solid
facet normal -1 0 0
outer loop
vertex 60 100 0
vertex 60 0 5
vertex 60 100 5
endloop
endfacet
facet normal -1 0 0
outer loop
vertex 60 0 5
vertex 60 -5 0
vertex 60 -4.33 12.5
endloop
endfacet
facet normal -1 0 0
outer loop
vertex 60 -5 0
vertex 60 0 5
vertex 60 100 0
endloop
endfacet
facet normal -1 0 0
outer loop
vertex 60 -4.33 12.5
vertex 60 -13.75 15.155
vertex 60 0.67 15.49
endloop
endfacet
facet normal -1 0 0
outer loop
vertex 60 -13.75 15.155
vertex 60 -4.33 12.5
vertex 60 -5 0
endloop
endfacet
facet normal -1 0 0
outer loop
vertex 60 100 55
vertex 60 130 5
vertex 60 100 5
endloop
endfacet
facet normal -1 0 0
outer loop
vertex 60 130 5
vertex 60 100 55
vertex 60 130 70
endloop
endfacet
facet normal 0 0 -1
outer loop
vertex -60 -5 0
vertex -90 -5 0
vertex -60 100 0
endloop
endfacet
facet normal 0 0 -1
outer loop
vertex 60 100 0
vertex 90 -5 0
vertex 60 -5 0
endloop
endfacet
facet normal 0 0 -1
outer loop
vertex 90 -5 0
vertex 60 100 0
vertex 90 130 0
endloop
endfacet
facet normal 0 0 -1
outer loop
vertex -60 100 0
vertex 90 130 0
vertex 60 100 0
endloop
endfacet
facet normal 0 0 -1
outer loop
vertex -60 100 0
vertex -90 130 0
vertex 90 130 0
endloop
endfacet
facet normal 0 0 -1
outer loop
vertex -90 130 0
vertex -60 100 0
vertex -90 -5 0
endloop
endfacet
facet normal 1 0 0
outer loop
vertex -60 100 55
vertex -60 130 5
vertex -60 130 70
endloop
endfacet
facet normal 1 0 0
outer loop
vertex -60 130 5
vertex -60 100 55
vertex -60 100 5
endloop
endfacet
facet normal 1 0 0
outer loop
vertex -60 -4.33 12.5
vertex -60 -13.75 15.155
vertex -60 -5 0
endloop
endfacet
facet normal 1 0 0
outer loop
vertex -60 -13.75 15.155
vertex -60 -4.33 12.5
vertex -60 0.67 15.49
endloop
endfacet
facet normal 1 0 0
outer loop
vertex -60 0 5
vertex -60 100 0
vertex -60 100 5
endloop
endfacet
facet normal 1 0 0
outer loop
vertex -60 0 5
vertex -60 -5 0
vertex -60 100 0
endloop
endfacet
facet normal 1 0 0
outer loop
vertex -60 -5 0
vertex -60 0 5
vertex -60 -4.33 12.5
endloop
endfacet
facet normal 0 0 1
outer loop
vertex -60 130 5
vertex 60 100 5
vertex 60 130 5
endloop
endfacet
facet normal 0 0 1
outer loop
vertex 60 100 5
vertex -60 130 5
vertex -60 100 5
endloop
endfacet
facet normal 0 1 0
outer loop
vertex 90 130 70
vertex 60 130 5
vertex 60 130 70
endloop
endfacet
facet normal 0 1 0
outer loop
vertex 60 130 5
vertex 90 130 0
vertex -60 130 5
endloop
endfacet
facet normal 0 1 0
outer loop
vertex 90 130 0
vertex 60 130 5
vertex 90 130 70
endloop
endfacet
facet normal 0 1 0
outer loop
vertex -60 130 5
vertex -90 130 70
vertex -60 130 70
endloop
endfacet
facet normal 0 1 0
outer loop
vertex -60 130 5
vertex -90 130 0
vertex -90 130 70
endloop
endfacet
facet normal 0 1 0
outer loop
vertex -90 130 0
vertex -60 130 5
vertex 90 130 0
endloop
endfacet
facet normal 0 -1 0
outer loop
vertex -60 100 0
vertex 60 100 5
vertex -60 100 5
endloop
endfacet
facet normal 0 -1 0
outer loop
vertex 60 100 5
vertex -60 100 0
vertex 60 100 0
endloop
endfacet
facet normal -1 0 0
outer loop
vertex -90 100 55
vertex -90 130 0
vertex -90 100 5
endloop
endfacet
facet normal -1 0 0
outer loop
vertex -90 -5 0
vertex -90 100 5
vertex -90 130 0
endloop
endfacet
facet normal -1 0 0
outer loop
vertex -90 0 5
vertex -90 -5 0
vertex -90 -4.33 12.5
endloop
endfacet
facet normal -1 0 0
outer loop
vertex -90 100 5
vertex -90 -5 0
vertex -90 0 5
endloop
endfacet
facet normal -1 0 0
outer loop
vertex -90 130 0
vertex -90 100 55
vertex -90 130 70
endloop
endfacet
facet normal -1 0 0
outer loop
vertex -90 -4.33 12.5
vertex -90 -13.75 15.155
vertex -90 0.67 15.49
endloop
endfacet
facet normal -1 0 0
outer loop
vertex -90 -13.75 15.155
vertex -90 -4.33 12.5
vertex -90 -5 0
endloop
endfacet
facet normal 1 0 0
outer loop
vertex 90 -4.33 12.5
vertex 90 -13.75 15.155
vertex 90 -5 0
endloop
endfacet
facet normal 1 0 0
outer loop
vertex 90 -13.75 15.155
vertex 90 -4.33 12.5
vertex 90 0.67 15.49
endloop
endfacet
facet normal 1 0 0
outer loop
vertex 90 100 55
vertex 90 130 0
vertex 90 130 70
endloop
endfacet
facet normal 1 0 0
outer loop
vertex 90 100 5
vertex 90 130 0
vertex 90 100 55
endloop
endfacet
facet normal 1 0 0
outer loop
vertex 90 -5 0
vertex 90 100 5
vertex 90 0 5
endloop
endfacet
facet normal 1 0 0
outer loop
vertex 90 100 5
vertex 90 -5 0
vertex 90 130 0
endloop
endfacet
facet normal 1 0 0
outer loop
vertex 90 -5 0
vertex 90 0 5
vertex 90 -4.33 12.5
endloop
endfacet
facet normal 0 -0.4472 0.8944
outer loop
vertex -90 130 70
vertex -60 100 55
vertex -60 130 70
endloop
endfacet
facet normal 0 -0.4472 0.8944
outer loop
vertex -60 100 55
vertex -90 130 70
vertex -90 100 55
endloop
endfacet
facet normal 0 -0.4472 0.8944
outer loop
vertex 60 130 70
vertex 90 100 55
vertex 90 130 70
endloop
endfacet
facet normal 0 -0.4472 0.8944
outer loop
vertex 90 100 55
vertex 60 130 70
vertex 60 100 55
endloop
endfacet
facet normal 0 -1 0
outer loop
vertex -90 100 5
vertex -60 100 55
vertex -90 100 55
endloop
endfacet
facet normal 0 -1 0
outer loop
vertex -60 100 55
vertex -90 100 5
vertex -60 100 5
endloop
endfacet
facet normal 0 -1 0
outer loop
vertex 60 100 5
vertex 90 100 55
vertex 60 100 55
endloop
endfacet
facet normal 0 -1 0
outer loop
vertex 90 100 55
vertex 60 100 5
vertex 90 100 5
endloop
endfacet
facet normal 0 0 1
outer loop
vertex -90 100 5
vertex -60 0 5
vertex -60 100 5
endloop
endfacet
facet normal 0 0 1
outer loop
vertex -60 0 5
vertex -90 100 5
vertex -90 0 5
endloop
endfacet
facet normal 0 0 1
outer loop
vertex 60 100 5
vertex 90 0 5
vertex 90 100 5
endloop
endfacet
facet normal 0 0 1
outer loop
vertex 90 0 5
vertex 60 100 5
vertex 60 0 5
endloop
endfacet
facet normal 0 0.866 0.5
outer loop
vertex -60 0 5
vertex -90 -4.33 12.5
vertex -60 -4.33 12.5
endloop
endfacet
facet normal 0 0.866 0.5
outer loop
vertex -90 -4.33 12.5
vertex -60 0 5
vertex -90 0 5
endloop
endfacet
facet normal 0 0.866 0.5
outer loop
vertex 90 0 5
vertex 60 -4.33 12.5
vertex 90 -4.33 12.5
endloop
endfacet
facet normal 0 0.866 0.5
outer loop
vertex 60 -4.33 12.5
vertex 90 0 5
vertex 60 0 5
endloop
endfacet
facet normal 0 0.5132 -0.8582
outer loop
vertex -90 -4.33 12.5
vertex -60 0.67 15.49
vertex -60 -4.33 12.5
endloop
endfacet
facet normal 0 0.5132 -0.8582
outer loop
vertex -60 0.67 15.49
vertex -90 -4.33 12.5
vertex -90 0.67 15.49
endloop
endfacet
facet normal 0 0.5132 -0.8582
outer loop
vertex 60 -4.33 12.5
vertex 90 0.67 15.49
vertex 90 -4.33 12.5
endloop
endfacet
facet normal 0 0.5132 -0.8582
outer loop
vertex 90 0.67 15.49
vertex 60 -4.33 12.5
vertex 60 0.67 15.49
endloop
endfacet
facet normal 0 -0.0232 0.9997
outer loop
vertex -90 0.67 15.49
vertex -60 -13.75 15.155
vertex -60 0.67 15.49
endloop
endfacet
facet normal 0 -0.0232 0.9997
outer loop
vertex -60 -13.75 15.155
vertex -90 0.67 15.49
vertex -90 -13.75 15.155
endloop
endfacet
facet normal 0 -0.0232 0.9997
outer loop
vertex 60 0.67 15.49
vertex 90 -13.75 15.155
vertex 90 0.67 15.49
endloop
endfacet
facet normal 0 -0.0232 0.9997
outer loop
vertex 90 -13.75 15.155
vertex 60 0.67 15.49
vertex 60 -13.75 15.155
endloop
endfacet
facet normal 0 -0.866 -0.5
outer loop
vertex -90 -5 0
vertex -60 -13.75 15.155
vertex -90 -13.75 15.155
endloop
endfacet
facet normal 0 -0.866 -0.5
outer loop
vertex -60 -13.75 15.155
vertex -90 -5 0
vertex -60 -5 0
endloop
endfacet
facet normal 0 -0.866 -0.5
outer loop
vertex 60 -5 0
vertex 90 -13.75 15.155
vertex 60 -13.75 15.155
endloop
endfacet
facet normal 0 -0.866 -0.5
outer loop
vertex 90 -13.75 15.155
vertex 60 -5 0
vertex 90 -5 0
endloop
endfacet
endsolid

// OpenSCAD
rubberWidth = 6.3;
rubberDistance = 15.7;
rubberElevation = 2.5;

rubberAura = 7;
auraElevation = 1;

rubberAuraElevation = rubberElevation - auraElevation;

baseHeight = 5;

baseWidth = 180;
baseLength = 130;

mainAngle = 30;

notebookFrontHeight = 15;
ventStart = 150;


pillarSize = 30;

pillarMaxHeight = baseLength * sin(mainAngle);


module plinth() {
    plinthSize = (2 * rubberAura + rubberWidth) * 1.1;
    plinthHeights = plinthSize / 2;
    
    cube([plinthSize, plinthSize, plinthSize], center = true);
    
    translate([0, 0, -plinthHeights])
        resize([plinthSize, plinthSize, plinthHeights])
            rotate([0, 0, 45])
                cylinder(h=20, r1=0, r2=1, $fn=4);
}

module notebook() {
    
    
}

notebook();

*plinth();


difference() {
    translate([-baseWidth / 2, 0, 0])
        rotate([90, 0, 90])
            linear_extrude(baseWidth)
                polygon(points = [[-baseHeight, 0], [baseLength, 0], 
                [baseLength, baseHeight + sin(mainAngle)  * baseLength], [baseLength - pillarSize, baseHeight + sin(mainAngle) * (baseLength - pillarSize)], [baseLength - pillarSize, baseHeight],
                    [0, baseHeight], [-baseHeight * cos(mainAngle), baseHeight + notebookFrontHeight*sin(mainAngle)], [baseHeight - baseHeight * cos(mainAngle), baseHeight + cos(mainAngle) * notebookFrontHeight - sin(mainAngle) * baseHeight], [-baseHeight - sin(mainAngle) * (notebookFrontHeight + baseHeight/ 2), cos(mainAngle) * (notebookFrontHeight + baseHeight / 2)]
                ]);
    
    translate([-baseWidth / 2 + pillarSize, -3 * baseHeight, 0]) {
    difference() {
            cube([baseWidth - 2 * pillarSize, baseLength + 4 * baseHeight, pillarMaxHeight + baseHeight]);
        
        translate([0, 3* baseHeight + baseLength - pillarSize, 0]) cube([baseWidth, pillarSize, baseHeight]);
    }
    }
    
}
